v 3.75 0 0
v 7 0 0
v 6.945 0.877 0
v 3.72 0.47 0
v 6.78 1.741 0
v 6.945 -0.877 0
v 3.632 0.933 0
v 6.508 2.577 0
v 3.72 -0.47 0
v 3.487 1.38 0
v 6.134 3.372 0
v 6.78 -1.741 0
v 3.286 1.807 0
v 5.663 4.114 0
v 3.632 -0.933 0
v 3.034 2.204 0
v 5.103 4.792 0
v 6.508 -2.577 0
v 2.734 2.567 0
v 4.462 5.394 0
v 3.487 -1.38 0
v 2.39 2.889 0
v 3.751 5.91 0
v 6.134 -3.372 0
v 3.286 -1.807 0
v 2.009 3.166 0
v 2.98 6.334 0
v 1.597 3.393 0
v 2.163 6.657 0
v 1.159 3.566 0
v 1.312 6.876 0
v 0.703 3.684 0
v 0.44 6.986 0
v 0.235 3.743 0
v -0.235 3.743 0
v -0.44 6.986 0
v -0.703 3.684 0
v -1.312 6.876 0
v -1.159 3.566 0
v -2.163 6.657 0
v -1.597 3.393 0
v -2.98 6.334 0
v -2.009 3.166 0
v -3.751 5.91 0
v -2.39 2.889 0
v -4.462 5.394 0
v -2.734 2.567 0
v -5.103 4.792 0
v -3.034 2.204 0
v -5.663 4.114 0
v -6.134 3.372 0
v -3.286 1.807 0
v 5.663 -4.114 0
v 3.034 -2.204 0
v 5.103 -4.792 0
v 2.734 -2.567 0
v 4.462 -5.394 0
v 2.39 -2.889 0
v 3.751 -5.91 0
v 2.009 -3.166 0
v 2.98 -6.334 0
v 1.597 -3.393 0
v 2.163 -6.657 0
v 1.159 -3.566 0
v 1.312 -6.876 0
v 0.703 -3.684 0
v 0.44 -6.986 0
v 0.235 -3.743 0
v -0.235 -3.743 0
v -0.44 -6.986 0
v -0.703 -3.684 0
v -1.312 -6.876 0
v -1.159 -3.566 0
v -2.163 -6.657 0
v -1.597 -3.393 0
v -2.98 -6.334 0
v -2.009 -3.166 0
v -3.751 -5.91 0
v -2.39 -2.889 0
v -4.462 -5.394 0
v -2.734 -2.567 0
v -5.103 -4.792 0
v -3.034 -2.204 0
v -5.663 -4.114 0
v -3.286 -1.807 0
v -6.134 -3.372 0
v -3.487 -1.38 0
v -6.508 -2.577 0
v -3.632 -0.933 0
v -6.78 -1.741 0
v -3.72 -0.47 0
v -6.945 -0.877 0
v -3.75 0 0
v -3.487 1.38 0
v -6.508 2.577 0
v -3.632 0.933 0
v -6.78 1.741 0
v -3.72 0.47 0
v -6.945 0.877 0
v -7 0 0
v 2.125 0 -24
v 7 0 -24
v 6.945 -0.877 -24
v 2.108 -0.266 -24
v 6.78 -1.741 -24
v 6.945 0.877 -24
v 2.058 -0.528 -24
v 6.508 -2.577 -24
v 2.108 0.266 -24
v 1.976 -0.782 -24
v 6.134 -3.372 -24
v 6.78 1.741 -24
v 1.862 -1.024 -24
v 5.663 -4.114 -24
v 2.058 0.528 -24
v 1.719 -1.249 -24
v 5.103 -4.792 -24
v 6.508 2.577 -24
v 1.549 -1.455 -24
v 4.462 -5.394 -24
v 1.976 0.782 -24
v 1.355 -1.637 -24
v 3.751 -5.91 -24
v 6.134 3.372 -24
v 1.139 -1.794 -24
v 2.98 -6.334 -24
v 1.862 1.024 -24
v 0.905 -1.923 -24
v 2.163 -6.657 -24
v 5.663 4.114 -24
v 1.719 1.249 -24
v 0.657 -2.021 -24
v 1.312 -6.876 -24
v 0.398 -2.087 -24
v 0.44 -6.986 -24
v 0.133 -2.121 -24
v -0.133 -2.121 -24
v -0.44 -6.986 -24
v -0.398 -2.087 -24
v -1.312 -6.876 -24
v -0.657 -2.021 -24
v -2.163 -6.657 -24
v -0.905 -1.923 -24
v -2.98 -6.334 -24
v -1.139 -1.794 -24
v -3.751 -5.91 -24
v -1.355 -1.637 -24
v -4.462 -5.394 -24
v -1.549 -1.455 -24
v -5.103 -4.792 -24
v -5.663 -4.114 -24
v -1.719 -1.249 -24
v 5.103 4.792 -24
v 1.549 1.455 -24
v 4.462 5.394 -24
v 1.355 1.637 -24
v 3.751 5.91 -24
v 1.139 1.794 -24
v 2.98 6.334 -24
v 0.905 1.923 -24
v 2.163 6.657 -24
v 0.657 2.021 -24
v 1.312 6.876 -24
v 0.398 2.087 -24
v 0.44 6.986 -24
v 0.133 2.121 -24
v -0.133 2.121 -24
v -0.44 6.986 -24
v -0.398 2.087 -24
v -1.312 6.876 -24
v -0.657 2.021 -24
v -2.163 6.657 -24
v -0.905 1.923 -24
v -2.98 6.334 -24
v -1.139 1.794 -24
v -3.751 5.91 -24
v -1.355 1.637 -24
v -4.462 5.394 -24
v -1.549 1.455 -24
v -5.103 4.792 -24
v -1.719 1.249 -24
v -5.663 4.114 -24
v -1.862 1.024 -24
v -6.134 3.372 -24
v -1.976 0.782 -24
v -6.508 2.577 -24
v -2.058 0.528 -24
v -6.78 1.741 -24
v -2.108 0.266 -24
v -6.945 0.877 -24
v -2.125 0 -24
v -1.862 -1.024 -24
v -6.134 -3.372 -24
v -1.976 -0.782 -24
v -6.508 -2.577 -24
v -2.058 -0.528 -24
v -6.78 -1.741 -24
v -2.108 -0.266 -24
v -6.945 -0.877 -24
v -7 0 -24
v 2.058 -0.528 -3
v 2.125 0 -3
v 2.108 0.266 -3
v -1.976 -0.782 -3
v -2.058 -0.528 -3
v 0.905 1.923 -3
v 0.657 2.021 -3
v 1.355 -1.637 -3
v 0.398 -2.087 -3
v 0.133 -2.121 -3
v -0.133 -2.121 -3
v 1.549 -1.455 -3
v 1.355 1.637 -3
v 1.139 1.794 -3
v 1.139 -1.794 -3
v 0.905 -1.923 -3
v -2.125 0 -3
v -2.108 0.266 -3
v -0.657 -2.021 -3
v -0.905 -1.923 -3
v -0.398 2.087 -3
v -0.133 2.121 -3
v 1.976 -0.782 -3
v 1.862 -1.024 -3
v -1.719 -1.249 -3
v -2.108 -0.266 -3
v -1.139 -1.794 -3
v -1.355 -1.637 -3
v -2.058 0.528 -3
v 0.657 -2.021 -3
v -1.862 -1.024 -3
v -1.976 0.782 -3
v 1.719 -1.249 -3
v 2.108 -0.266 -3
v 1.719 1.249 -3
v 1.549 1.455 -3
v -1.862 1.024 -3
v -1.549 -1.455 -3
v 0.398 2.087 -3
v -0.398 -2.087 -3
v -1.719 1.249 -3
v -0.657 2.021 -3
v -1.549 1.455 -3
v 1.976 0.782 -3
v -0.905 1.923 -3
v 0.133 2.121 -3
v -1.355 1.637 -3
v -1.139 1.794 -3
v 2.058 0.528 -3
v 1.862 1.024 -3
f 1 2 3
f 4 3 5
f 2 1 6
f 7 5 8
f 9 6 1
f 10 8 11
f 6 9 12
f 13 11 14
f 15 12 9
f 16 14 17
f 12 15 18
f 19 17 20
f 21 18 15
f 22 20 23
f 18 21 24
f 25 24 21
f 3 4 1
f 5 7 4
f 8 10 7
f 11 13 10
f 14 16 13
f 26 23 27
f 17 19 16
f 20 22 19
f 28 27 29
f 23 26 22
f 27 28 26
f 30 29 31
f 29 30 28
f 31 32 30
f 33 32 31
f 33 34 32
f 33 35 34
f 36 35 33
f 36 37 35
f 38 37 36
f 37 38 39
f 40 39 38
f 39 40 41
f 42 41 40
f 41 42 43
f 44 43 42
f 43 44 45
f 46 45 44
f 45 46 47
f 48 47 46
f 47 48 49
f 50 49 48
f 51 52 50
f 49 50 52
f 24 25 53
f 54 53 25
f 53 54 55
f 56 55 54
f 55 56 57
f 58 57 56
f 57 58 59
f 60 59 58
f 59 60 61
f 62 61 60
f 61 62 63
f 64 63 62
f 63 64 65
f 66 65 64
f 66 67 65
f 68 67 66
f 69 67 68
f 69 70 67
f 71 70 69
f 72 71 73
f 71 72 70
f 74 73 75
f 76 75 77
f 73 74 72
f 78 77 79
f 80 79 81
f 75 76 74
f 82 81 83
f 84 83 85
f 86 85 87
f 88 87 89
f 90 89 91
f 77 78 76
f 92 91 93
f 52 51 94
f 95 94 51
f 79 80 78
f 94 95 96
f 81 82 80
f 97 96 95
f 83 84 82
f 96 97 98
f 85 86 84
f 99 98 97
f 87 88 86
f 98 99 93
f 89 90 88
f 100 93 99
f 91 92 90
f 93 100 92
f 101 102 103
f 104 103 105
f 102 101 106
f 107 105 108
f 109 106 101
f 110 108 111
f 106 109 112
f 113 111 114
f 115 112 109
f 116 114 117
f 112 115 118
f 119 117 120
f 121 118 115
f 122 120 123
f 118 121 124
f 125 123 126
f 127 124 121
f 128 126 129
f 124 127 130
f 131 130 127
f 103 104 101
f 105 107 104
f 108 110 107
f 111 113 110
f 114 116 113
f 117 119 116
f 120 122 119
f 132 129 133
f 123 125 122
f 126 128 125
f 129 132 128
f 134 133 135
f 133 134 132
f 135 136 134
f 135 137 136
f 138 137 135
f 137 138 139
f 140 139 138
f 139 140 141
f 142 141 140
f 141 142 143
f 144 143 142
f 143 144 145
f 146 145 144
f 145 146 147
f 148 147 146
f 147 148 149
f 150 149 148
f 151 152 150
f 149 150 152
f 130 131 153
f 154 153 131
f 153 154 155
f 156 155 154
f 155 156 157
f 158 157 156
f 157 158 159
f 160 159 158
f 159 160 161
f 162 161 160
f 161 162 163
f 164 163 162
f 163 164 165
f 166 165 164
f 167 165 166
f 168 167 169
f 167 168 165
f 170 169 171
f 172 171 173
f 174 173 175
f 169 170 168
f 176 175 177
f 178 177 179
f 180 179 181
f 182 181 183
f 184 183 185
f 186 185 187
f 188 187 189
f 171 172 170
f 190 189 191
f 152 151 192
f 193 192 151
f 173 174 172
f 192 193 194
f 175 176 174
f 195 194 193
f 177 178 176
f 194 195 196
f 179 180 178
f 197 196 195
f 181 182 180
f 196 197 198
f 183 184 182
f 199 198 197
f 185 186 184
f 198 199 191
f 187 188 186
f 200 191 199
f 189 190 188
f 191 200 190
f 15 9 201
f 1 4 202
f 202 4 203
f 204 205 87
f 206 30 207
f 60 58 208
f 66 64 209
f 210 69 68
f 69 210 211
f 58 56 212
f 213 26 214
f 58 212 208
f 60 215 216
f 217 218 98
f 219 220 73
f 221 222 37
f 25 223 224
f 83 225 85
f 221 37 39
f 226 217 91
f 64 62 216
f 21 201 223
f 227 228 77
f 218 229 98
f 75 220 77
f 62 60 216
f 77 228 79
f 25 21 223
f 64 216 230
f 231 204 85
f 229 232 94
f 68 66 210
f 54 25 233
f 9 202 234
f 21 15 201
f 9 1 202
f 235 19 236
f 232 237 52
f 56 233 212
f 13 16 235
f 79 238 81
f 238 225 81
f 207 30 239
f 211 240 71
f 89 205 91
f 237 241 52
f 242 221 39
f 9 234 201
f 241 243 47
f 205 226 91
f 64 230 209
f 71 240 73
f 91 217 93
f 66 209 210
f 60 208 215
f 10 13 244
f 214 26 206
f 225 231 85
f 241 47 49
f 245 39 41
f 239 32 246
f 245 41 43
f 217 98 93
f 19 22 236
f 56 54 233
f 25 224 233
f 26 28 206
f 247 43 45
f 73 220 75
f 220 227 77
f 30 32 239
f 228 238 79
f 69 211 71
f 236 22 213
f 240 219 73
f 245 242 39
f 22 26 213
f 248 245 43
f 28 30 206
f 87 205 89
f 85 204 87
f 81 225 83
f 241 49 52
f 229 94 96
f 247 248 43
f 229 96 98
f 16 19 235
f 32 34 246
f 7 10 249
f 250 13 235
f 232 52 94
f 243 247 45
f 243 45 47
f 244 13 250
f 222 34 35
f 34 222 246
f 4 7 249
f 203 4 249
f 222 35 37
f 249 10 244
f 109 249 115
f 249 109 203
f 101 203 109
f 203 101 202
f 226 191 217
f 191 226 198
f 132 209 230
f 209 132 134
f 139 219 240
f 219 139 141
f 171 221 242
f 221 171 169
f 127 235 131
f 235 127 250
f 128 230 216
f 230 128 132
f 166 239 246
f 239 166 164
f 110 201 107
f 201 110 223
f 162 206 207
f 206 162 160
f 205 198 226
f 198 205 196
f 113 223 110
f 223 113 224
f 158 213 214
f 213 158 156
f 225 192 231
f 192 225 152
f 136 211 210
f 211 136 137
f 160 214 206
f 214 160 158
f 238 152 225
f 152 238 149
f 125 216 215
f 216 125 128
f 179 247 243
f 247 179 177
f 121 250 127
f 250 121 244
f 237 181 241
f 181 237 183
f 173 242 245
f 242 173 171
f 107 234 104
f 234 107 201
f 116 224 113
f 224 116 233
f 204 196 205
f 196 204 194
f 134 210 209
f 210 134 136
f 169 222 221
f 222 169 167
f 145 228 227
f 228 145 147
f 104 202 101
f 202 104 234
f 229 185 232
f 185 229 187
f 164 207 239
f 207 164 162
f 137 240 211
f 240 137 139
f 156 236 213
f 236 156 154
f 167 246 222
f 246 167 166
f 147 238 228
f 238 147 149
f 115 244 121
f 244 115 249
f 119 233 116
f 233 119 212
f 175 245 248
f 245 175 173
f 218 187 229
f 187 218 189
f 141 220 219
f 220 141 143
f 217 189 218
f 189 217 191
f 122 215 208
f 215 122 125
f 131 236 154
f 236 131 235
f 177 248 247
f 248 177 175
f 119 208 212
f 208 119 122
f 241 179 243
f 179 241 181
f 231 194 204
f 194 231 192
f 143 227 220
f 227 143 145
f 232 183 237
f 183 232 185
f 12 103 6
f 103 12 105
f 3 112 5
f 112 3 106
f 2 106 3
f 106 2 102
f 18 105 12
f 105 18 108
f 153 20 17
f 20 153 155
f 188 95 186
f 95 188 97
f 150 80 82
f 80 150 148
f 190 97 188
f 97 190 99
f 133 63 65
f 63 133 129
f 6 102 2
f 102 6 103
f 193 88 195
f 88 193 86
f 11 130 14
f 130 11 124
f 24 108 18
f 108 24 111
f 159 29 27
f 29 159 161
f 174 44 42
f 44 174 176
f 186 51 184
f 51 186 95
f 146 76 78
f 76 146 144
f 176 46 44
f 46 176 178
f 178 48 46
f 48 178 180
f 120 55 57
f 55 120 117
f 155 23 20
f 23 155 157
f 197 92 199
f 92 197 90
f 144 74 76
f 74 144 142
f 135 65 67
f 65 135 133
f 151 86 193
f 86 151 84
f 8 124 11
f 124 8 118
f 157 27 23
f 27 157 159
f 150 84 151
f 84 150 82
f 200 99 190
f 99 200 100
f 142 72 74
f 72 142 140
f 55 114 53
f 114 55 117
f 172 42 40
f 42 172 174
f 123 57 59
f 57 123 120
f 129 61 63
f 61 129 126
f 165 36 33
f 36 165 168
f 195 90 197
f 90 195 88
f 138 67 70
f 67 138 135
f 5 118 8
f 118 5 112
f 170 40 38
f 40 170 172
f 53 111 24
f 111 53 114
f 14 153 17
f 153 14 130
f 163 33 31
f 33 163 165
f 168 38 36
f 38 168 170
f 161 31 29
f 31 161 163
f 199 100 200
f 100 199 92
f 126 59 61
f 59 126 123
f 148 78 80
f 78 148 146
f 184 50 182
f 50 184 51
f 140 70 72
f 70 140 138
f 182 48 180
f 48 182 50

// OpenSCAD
$fn = 50;


difference() {
	union() {
		translate(v = [0, 0, -24.0000000000]) {
			cylinder(h = 24, r = 7.0000000000);
		}
		cylinder(h = 0, r = 10.0000000000);
	}
	union() {
		translate(v = [0, 0, 0]) {
			rotate(a = [0, 0, 0]) {
				difference() {
					union() {
						#translate(v = [0, 0, -24.0000000000]) {
							cylinder(h = 24, r = 2.0000000000);
						}
						#translate(v = [0, 0, -3]) {
							cylinder(h = 3, r = 7.0000000000, r1 = 2.1250000000, r2 = 3.7500000000);
						}
						#translate(v = [0, 0, -24.0000000000]) {
							cylinder(h = 24, r = 2.1250000000);
						}
						#translate(v = [0, 0, -24.0000000000]) {
							cylinder(h = 24, r = 2.0000000000);
						}
					}
					union();
				}
			}
		}
	}
}
